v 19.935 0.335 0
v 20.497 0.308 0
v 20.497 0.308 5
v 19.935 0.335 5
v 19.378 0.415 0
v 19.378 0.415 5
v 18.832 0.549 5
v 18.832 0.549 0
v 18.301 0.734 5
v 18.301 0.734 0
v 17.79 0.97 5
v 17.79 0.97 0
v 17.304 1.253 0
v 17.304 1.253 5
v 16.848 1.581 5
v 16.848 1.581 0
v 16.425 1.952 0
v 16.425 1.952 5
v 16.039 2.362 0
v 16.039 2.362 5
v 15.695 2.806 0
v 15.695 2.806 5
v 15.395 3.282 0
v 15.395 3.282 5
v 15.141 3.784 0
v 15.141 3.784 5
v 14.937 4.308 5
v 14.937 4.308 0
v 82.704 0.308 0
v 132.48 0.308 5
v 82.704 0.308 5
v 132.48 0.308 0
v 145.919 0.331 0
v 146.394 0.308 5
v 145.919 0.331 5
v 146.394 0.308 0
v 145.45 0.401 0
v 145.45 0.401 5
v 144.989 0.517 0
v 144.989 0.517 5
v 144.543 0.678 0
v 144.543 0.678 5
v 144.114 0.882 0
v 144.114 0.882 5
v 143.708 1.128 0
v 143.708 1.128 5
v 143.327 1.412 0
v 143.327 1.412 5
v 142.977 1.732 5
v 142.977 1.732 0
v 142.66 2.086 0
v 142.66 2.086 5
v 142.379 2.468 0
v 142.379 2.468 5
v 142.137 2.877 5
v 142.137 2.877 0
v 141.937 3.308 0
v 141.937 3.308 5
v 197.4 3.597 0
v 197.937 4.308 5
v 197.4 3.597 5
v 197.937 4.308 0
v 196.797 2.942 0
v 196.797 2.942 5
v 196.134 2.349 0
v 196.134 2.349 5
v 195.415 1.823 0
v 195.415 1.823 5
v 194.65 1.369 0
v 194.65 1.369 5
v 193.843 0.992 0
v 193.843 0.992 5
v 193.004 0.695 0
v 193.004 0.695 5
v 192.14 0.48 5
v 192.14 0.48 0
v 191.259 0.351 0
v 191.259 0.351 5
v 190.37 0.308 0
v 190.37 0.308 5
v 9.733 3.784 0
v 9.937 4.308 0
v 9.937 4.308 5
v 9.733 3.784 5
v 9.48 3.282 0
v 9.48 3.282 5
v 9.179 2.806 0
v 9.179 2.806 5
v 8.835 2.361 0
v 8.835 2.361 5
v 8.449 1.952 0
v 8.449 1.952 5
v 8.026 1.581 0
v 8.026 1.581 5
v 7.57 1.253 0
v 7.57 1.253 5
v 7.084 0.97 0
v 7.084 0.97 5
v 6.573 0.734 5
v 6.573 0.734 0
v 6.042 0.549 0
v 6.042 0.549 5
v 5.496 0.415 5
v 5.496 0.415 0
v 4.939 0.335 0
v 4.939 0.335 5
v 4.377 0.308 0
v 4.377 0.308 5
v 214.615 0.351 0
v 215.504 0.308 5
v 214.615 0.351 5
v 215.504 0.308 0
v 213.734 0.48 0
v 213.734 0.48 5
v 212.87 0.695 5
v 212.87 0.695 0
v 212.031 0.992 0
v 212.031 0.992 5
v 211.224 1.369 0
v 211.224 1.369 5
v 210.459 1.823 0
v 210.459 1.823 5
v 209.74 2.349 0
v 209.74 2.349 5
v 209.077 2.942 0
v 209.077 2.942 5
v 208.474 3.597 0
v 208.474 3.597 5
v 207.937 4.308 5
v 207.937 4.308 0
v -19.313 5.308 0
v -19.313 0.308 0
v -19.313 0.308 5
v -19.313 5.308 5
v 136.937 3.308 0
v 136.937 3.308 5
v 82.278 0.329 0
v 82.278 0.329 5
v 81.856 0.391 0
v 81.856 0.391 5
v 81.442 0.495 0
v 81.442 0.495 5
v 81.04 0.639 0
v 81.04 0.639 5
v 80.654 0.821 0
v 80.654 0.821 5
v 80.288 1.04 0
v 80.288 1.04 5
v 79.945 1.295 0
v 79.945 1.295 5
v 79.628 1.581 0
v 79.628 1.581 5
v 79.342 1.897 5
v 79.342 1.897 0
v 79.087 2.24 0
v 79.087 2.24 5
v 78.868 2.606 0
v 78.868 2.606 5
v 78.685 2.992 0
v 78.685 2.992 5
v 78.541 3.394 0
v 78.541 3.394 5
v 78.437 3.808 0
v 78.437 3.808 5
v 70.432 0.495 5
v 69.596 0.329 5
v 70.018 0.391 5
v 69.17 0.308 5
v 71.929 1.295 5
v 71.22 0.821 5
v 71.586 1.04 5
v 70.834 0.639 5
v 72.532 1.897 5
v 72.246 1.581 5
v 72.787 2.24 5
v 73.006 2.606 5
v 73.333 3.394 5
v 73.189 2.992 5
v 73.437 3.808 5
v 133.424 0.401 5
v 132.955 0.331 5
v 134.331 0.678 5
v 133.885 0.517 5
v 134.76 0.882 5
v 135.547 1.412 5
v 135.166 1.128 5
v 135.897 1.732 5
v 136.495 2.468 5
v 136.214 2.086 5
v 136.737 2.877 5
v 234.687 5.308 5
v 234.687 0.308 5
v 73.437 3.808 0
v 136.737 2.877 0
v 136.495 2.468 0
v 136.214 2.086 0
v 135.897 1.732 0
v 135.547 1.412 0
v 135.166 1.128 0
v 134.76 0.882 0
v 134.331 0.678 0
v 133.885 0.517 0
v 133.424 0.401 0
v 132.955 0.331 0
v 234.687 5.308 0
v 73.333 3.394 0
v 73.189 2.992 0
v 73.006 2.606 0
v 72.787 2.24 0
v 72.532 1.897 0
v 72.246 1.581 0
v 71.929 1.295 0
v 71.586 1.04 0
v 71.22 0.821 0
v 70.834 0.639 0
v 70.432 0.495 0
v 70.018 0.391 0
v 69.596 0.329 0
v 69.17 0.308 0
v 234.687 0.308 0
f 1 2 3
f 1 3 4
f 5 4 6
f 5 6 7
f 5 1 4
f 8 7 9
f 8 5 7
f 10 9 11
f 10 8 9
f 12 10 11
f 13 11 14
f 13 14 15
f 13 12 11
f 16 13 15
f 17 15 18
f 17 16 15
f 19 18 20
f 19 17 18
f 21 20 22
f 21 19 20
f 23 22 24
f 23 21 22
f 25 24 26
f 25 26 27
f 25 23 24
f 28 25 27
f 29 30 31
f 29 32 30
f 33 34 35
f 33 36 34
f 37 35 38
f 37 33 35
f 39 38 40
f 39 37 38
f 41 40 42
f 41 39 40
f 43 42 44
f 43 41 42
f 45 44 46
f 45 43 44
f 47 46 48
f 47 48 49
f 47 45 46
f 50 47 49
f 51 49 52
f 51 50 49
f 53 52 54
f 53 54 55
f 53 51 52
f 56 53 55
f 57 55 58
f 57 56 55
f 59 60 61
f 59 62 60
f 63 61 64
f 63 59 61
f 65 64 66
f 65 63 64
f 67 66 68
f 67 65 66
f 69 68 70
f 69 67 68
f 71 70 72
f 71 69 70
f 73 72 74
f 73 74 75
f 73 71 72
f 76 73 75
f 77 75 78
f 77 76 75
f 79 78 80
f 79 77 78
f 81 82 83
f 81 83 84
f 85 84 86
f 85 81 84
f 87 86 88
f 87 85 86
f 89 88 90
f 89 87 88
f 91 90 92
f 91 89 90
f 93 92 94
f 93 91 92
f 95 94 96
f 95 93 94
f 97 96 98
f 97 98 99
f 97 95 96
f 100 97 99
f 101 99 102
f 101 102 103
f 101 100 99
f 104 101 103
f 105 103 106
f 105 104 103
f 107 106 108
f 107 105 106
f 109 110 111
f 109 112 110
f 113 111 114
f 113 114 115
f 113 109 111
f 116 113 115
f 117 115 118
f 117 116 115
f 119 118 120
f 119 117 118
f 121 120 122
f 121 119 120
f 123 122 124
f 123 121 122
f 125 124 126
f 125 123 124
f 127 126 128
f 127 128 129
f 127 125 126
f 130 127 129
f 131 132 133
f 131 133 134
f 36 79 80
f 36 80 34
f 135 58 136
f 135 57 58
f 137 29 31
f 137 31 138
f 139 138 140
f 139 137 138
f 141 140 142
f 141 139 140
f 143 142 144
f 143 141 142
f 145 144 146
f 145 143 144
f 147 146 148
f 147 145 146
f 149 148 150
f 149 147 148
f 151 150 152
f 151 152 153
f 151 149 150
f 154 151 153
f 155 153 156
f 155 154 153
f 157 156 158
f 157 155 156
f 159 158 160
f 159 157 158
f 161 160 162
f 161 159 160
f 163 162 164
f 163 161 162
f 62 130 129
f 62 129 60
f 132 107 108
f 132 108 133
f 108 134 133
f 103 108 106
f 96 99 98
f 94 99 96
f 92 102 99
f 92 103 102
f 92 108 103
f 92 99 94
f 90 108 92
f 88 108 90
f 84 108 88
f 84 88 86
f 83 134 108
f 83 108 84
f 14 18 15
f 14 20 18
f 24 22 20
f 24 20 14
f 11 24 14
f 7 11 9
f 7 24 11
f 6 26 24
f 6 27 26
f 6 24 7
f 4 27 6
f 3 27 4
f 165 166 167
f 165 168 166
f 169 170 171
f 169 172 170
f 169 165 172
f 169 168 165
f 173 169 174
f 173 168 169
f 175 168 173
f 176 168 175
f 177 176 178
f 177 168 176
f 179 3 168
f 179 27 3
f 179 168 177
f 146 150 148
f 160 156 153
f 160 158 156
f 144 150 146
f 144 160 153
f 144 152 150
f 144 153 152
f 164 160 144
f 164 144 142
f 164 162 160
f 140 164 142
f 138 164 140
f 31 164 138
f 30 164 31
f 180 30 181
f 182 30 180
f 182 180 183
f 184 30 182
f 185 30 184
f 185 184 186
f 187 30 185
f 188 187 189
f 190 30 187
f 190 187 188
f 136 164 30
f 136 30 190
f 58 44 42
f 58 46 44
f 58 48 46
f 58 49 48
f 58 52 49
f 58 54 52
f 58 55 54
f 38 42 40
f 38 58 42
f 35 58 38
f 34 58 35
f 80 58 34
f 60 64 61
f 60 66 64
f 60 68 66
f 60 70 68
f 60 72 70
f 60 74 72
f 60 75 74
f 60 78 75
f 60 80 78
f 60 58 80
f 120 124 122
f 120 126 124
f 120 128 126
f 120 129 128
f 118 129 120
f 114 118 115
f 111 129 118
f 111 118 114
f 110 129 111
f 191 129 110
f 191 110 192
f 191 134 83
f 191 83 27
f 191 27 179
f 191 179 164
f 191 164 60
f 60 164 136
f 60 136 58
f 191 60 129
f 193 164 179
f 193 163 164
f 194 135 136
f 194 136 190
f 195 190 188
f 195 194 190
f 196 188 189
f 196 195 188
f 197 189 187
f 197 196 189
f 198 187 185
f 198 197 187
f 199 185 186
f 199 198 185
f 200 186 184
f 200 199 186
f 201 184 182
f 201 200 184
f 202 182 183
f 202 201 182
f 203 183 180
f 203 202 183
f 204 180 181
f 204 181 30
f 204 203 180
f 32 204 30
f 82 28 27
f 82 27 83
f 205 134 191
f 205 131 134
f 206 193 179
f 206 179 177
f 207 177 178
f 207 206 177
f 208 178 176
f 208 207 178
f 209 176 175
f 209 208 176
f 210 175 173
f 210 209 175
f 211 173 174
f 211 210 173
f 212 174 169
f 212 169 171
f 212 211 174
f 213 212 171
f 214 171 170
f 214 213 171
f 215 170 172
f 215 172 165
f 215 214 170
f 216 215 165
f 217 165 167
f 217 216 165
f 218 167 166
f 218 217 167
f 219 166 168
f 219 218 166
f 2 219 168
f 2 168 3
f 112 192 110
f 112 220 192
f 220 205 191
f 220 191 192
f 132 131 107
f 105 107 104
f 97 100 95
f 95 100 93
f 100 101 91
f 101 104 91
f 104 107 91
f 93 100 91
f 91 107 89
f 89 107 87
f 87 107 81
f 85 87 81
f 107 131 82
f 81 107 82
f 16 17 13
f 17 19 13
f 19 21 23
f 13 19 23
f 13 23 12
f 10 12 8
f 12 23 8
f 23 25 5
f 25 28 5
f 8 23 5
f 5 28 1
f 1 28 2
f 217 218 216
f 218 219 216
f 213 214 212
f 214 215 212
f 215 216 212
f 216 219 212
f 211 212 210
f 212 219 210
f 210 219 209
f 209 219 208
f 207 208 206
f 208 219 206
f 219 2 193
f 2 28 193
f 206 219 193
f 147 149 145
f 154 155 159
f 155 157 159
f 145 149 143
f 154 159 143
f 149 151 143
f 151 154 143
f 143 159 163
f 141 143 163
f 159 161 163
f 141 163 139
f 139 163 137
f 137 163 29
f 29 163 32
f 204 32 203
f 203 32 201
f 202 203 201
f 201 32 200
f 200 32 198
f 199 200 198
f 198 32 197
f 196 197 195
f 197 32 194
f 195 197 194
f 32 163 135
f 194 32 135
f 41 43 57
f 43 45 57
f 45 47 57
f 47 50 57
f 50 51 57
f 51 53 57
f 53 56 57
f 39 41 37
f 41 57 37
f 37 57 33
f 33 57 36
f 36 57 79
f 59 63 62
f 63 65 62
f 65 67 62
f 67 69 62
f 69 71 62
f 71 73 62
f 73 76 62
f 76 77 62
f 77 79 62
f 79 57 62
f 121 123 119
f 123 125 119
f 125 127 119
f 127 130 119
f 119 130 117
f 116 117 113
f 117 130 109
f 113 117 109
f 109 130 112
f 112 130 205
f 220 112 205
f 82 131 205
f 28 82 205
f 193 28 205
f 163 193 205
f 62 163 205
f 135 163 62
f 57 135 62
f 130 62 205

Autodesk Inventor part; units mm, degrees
ref_plane "YZ Plane" through (0, 0, 0) normal (1, 0, 0) x (0, 1, 0)
ref_plane "XZ Plane" through (0, 0, 0) normal (0, 1, 0) x (-1, 0, 0)
ref_plane "XY Plane" through (0, 0, 0) normal (0, 0, 1) x (1, 0, 0)
sketch "Sketch1" plane through (0, 0, 0) normal (0, 0, 1) x (1, 0, 0)
  line L0 (-19.313, 5.3077) -> (234.687, 5.3077)
  line L1 (234.687, 5.3077) -> (234.687, 0.3077)
  line L2 (234.687, 0.3077) -> (-19.313, 0.3077)
  line L3 (-19.313, 0.3077) -> (-19.313, 5.3077)
  line L4 (44.187, 5.3077) -> (44.187, 0.3077) construction
  line L5 (171.187, 5.3077) -> (171.187, 0.3077) construction
  line L6 (107.687, 5.3077) -> (107.687, 0.3077) construction
  point P0 (0, 0)
  dimension "d0" = 254
  dimension "d1" = 5
  dimension "d2" = 63.5
  dimension "d3" = 63.5
  dimension "d4" = 63.5
extrude "Extrusion1" add sketch "Sketch1" along normal blind 5
sketch "Sketch2" plane through (0, 0, 0) normal (0, 0, -1) x (-1, 0, 0)
  line L0 (19.313, 0.3077) -> (-234.687, 0.3077) projected
  arc A0 (-20.4966, 0.3077) -> (-14.937, 4.3077) centre (-20.4966, 6.1713) ccw
  arc A1 (-9.937, 4.3077) -> (-4.3774, 0.3077) centre (-4.3774, 6.1713) ccw
  line L1 (-14.937, 4.3077) -> (-9.937, 4.3077)
  line L2 (19.313, 0.3077) -> (-234.687, 0.3077) projected
  line L3 (-234.687, 5.3077) -> (19.313, 5.3077) projected
  arc A2 (-82.7042, 0.3077) -> (-78.437, 3.8077) centre (-82.7042, 4.659) ccw
  arc A3 (-73.437, 3.8077) -> (-69.1698, 0.3077) centre (-69.1698, 4.659) ccw
  line L4 (-78.437, 3.8077) -> (-73.437, 3.8077)
  arc A4 (-146.3937, 0.3077) -> (-141.937, 3.3077) centre (-146.3937, 5.1181) ccw
  arc A5 (-136.937, 3.3077) -> (-132.4803, 0.3077) centre (-132.4803, 5.1181) ccw
  line L5 (-141.937, 3.3077) -> (-136.937, 3.3077)
  arc A6 (-215.504, 0.3077) -> (-207.937, 4.3077) centre (-215.504, 9.4651) ccw
  arc A7 (-197.937, 4.3077) -> (-190.37, 0.3077) centre (-190.37, 9.4651) ccw
  line L6 (-207.937, 4.3077) -> (-197.937, 4.3077)
  line L7 (19.313, 5.3077) -> (19.313, 0.3077) projected
  point P0 (0, 0)
  point P1 (19.313, 2.8077)
  point P2 (-12.437, 4.3077)
  point P3 (-75.937, 3.8077)
  point P4 (-139.437, 3.3077)
  point P5 (-202.937, 4.3077)
  point P6 (-82.7042, 0.3077)
  point P7 (-69.1698, 0.3077)
  point P8 (-146.3937, 0.3077)
  point P9 (-132.4803, 0.3077)
  point P10 (-215.504, 0.3077)
  point P11 (-190.37, 0.3077)
  dimension "d7" = 1
  dimension "d8" = 1.5
  dimension "d9" = 2
  dimension "d10" = 1
  dimension "d11" = 5
  dimension "d12" = 10
  dimension "d14" = 31.75
  dimension "d15" = 63.5
  dimension "d16" = 63.5
  dimension "d17" = 63.5
extrude "Extrusion2" cut sketch "Sketch2" against normal through all
properties part number "Hingetest"
